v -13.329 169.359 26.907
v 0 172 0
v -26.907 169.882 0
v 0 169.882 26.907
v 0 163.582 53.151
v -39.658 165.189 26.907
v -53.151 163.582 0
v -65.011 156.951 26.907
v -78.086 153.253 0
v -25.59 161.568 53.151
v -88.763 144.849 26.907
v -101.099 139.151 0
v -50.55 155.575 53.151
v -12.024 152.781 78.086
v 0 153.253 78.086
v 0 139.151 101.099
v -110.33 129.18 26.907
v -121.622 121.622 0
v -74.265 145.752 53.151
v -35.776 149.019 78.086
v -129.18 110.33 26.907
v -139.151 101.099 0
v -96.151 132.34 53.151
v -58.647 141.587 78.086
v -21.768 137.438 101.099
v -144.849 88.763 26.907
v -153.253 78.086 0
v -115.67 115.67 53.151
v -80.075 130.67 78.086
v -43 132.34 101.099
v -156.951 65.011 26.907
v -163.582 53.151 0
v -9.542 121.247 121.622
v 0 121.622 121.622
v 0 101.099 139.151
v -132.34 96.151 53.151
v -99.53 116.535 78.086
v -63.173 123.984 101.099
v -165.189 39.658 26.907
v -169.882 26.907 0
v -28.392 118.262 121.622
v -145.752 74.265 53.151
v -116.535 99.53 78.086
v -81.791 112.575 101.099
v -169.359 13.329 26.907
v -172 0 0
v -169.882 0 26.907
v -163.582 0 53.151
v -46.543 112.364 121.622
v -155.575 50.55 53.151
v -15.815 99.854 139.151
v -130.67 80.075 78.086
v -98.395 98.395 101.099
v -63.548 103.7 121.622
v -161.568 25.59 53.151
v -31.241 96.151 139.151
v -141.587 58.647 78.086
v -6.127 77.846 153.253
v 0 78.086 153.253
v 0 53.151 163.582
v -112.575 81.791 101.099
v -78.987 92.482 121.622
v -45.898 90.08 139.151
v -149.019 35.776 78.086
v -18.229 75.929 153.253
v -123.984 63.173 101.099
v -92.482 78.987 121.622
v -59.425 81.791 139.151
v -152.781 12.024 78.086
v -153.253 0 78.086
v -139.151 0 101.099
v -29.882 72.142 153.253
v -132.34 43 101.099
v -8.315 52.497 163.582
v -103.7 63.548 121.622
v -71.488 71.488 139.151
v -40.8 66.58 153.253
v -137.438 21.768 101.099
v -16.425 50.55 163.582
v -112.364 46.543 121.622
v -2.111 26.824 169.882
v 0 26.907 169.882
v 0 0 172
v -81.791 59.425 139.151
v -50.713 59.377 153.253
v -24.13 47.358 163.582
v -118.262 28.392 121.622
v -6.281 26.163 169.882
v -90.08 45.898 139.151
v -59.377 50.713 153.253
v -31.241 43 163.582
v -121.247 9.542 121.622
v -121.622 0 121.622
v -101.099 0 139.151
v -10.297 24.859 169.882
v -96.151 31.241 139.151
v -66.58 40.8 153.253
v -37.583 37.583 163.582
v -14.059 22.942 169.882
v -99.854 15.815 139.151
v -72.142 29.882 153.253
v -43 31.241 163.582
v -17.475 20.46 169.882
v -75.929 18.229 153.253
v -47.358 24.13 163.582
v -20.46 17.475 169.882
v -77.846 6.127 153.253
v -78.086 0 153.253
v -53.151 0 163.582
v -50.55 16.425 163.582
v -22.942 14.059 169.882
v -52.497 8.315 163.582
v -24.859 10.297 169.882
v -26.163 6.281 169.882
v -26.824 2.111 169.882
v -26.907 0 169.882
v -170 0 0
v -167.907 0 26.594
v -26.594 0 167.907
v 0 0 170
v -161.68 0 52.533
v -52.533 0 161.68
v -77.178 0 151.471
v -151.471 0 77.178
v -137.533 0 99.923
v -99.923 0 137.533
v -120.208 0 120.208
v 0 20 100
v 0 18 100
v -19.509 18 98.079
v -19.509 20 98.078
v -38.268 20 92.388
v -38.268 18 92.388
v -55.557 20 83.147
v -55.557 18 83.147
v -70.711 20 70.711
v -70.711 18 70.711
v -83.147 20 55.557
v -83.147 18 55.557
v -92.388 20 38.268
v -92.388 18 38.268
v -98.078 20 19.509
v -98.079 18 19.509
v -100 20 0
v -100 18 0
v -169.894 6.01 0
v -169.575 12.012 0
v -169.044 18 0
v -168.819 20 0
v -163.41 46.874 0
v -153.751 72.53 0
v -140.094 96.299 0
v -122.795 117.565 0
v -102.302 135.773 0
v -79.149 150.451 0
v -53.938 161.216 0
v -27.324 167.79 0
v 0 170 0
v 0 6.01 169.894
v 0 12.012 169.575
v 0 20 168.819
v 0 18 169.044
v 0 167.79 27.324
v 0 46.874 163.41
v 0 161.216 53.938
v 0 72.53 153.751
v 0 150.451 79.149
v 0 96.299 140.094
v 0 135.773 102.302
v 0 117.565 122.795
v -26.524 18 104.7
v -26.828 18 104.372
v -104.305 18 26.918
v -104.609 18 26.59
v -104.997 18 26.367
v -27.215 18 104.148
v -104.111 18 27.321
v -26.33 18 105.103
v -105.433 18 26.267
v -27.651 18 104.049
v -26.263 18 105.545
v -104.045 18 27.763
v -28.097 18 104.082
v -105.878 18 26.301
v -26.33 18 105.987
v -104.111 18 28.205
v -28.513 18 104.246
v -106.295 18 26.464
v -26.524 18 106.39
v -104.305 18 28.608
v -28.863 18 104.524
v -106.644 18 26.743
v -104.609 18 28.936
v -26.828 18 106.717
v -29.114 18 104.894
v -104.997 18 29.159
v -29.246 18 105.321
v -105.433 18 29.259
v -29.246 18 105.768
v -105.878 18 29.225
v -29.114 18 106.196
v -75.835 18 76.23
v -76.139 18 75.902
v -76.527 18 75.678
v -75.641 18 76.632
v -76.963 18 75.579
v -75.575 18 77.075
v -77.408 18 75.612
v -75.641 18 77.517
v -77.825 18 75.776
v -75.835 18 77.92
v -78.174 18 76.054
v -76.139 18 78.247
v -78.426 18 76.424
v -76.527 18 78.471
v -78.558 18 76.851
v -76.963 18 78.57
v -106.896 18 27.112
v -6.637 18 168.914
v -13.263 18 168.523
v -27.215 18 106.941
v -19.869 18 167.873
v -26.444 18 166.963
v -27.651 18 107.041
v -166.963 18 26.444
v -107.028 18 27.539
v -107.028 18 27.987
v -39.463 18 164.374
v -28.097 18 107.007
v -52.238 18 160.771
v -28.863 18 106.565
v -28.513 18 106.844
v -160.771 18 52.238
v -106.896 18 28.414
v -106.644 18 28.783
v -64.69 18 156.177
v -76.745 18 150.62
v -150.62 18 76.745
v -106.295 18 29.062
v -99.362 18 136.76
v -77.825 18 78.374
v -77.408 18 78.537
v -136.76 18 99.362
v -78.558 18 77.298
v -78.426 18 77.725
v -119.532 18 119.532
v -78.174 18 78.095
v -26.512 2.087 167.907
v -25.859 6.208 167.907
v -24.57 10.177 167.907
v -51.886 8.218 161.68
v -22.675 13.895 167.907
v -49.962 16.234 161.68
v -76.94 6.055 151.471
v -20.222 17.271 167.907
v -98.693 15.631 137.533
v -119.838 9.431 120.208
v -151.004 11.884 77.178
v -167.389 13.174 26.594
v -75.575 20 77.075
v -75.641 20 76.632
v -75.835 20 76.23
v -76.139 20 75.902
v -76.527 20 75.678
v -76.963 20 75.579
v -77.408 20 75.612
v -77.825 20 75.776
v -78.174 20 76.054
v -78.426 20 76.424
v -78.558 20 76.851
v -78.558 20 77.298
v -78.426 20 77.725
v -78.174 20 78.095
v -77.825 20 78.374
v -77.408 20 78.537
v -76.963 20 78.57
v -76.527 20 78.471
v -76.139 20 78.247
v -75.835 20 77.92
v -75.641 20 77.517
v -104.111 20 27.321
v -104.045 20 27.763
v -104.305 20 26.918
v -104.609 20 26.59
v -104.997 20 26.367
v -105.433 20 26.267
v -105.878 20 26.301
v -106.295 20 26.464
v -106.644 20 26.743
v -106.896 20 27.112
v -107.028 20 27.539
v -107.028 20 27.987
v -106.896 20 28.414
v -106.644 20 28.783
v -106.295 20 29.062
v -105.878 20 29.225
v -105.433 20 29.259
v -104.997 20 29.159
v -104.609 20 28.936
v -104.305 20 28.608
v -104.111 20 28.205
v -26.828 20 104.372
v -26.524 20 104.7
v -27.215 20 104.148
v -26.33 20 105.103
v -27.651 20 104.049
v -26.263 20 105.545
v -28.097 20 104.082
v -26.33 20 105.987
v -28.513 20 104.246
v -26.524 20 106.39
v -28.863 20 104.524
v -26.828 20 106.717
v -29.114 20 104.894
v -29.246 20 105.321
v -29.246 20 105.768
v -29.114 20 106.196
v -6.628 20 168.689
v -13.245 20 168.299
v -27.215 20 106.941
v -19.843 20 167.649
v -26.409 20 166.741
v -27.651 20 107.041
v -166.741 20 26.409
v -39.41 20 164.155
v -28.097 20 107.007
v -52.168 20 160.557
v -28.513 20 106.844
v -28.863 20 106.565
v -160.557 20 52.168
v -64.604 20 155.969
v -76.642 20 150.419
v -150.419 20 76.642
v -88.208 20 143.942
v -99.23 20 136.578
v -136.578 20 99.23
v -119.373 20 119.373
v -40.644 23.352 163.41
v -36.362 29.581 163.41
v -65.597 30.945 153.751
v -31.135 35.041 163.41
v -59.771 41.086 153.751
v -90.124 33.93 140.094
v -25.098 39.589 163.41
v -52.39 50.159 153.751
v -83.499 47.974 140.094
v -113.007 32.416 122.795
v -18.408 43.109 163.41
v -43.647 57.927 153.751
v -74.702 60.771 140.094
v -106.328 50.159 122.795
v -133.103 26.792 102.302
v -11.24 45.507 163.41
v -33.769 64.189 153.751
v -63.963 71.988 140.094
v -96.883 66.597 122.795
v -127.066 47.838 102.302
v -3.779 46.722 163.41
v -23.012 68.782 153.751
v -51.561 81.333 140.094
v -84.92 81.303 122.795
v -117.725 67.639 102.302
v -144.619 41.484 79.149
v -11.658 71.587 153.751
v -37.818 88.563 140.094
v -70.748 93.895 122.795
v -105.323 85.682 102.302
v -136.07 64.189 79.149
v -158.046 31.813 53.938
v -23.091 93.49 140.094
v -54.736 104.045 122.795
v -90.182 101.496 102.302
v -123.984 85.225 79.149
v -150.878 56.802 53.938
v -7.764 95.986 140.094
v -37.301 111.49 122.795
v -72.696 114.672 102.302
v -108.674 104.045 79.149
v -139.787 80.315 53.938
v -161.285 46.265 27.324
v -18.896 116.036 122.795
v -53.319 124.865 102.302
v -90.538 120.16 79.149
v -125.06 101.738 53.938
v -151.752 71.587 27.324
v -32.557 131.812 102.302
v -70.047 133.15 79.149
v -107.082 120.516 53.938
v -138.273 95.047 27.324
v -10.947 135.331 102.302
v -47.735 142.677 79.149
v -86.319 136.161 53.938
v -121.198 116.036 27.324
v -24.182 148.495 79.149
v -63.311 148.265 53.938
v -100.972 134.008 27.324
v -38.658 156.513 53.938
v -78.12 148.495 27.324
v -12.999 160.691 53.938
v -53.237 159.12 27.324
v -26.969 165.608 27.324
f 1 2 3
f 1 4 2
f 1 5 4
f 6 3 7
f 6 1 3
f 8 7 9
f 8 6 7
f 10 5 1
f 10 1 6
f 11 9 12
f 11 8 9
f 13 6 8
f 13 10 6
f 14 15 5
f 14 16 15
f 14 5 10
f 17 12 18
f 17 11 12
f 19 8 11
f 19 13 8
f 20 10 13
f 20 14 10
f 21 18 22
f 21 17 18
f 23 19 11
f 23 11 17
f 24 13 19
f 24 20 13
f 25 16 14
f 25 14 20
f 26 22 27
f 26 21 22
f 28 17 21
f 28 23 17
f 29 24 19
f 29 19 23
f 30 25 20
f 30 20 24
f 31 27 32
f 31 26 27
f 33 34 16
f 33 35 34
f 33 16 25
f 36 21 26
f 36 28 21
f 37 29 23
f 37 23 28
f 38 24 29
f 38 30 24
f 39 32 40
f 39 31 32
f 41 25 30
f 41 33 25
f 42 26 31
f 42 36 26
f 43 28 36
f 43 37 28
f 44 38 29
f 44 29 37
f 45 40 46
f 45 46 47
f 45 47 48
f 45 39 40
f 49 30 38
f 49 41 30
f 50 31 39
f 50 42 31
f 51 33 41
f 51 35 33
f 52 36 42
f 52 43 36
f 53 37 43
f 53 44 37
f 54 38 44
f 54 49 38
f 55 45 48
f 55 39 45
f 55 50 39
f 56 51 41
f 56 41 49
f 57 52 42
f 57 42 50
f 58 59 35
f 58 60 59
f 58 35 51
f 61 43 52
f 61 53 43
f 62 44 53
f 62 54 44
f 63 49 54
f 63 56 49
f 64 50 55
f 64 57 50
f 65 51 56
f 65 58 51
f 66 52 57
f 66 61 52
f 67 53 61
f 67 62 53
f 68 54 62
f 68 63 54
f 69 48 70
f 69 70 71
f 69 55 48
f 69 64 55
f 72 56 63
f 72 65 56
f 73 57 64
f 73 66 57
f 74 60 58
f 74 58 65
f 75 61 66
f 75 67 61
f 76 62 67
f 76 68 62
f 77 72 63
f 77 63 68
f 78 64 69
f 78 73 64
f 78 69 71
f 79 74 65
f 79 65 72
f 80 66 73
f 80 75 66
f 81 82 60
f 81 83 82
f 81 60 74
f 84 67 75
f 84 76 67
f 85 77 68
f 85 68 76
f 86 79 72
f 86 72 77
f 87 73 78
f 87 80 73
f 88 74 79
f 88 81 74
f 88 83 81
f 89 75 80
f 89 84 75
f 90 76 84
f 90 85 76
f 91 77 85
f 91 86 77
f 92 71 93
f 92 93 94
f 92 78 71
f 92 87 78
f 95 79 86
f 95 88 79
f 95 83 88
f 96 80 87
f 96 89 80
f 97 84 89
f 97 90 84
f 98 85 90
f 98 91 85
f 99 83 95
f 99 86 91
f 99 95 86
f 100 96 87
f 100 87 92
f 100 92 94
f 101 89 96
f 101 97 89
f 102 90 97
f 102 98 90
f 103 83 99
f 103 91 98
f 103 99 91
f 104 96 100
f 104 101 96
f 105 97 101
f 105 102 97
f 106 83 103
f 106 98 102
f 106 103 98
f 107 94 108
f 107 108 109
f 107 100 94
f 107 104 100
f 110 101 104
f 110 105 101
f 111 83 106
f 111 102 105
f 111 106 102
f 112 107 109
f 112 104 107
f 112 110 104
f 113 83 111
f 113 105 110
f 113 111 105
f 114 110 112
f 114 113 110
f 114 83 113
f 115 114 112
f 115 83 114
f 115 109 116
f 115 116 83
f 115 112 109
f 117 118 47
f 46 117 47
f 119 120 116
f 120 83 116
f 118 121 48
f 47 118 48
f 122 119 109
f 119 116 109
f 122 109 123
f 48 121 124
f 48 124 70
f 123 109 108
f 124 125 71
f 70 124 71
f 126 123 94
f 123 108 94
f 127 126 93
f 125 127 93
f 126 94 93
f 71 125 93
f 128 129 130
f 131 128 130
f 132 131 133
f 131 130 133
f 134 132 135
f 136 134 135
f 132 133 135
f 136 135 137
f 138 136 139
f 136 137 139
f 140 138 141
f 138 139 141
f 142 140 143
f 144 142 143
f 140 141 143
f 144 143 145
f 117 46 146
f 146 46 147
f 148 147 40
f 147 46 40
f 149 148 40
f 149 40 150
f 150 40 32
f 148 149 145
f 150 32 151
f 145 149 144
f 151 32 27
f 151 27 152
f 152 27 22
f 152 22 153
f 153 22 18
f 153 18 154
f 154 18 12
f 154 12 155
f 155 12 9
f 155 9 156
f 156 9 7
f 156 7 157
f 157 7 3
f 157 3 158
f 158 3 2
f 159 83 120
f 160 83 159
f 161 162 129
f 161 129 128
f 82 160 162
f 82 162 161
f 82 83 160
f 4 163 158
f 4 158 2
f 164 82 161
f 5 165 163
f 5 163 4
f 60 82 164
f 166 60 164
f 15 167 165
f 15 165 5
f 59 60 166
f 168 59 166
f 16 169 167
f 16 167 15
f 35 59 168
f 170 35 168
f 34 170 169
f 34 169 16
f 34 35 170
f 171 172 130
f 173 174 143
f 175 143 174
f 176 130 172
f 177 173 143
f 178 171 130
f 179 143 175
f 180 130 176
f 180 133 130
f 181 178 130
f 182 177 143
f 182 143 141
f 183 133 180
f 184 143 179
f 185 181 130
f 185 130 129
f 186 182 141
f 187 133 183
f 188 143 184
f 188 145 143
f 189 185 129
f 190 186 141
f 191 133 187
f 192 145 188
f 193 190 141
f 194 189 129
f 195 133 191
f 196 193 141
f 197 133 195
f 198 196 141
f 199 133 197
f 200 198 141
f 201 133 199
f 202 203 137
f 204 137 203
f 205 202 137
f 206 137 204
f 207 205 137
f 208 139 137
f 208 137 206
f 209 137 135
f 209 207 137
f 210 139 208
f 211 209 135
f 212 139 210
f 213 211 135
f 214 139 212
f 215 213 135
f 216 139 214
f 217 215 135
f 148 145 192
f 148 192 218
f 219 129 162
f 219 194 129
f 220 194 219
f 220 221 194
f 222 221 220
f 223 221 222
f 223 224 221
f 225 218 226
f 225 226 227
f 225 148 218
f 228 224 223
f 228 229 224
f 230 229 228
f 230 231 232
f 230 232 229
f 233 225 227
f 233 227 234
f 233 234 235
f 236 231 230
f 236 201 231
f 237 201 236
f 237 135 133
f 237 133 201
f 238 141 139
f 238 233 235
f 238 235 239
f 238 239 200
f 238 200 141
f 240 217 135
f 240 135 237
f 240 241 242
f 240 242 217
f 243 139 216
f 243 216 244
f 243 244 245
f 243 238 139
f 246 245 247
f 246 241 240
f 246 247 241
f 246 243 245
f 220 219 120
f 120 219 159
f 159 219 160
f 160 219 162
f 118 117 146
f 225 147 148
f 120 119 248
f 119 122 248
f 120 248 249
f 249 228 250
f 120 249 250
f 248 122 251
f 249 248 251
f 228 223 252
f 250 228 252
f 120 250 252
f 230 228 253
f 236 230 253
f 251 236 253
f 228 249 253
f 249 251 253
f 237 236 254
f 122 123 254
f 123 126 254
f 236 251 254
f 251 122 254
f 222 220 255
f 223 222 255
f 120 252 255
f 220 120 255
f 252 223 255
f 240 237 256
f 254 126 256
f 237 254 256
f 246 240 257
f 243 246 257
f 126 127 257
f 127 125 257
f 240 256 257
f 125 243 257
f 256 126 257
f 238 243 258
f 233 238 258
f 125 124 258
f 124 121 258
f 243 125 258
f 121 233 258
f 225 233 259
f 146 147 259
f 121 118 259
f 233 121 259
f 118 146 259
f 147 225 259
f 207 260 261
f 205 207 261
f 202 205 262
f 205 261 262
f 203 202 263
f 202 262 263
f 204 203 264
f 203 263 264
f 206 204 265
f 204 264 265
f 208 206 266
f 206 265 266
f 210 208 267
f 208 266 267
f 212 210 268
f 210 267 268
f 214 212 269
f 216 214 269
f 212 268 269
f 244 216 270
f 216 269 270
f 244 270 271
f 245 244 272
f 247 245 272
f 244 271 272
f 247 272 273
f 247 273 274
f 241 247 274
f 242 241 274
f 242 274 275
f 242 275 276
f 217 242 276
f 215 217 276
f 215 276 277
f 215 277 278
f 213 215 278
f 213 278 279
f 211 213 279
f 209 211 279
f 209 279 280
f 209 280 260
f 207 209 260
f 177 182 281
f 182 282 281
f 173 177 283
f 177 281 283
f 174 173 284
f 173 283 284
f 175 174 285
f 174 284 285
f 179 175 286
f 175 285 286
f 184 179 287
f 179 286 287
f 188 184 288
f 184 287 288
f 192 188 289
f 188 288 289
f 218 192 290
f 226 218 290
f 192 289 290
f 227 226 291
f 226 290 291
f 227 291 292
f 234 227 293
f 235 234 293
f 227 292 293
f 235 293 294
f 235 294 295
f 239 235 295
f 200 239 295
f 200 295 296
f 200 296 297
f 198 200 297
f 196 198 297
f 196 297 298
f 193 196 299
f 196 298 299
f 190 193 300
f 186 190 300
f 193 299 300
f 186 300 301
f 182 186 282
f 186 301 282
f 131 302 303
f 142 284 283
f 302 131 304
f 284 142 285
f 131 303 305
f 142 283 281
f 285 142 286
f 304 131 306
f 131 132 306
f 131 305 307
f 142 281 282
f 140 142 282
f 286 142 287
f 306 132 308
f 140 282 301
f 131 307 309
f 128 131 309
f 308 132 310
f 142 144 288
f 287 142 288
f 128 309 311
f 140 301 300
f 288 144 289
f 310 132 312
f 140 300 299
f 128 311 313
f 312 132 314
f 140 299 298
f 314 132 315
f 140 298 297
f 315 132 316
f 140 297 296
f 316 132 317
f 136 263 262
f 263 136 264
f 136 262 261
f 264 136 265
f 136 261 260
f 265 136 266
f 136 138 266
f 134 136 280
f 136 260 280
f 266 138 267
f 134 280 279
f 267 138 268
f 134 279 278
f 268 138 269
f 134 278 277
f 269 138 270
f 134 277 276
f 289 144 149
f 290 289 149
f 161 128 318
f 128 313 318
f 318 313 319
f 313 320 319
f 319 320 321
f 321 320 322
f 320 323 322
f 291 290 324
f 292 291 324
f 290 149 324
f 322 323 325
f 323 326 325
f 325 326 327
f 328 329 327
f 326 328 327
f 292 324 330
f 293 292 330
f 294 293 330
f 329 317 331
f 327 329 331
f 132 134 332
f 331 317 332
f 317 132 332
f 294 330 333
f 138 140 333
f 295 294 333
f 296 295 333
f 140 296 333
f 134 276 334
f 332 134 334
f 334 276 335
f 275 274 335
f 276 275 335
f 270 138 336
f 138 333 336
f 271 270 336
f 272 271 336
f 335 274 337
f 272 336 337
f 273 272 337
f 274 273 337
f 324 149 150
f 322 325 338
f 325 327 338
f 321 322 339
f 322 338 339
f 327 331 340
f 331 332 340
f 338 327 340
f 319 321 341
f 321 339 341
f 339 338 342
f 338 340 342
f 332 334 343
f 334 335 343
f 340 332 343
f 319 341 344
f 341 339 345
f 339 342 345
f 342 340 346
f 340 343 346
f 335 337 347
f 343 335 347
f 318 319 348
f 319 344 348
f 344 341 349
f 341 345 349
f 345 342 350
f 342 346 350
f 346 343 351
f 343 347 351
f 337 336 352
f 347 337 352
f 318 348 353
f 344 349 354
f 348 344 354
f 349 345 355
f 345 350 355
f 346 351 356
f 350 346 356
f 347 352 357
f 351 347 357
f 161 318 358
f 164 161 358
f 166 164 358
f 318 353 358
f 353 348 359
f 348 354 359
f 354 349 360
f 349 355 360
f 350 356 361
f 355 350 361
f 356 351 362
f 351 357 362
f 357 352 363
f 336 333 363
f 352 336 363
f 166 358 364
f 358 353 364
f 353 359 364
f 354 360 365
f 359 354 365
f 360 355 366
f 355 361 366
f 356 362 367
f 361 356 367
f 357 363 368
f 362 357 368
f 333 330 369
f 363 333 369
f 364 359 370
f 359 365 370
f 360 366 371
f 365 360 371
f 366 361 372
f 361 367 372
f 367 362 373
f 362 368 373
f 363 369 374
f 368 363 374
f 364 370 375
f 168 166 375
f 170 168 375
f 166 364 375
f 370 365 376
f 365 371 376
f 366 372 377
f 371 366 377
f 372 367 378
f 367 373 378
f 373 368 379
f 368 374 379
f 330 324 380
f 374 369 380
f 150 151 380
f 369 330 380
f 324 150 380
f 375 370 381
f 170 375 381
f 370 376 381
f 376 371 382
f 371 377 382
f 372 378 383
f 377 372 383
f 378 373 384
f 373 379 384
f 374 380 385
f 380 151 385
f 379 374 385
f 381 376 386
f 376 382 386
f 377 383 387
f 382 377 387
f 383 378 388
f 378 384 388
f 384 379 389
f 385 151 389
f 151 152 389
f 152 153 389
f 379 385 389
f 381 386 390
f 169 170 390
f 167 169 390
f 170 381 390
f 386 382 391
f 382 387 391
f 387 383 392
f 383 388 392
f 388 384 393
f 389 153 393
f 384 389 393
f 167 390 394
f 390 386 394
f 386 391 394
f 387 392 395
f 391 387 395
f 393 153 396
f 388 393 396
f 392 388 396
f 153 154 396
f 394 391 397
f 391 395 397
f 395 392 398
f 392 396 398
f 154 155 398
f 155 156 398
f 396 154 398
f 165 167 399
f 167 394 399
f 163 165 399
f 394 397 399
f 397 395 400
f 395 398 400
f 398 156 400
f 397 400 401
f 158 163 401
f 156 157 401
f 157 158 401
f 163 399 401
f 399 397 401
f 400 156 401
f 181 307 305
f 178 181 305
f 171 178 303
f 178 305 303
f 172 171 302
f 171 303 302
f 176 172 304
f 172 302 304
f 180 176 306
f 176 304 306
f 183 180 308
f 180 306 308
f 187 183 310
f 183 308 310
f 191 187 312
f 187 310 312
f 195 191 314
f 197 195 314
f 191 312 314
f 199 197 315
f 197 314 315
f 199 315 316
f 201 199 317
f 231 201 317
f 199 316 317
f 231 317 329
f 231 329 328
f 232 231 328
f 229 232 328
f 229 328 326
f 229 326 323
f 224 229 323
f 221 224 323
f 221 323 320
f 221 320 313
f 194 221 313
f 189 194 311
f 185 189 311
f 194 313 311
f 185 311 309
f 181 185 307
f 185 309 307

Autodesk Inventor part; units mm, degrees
ref_plane "YZ Plane" through (0, 0, 0) normal (1, 0, 0) x (0, 1, 0)
ref_plane "XZ Plane" through (0, 0, 0) normal (0, 1, 0) x (-1, 0, 0)
ref_plane "XY Plane" through (0, 0, 0) normal (0, 0, 1) x (1, 0, 0)
sketch "Sketch1" plane through (0, 0, 0) normal (0, 1, 0) x (-1, 0, 0)
  arc A0 (172, 0) -> (0, 172) centre (0, 0) ccw
  line L0 (0, 172) -> (0, 0)
  line L1 (172, 0) -> (0, 0)
revolve "Revolution1" add sketch "Sketch1" angle 90 about axis through (0, 0, 172) along (0, 0, -1)
sketch "Sketch2" plane through (-172, 0, 0) normal (0, -1, 0) x (1, 0, 0)
  arc A0 (172, 170) -> (2, 0) centre (172, 0) ccw
  line L0 (172, 0) -> (172, 172) projected
  line L1 (172, 0) -> (2, 0)
  line L2 (172, 0) -> (172, 170)
revolve "Revolution2" cut sketch "Sketch2" angle 90 about axis through (0, 0, 0) along (0, 0, -1)
sketch "Sketch3" plane through (0, 0, 0) normal (1, 0, 0) x (0, -0.7071068, -0.7071068)
  arc A0 (-121.6224, 121.6224) -> (-121.6224, -121.6224) centre (0, 0) ccw projected
  arc A1 (-120.2082, 120.2082) -> (-120.2082, -120.2082) centre (0, 0) ccw projected
  line L0 (-121.6224, -121.6224) -> (-101.6224, -121.6224) construction
  line L1 (0, 0) -> (-121.6224, 121.6224) projected
  line L2 (0, 0) -> (-14.1421, 14.1421)
  line L3 (-84.8528, -56.5685) -> (-133.5155, -105.2312)
  line L4 (-84.8528, -56.5685) -> (-83.4386, -57.9828)
  line L5 (-83.4386, -57.9828) -> (-132.2603, -106.8045)
  point P0 (-134.7537, -103.641)
  dimension "d49" = 2
revolve "Revolution3" add sketch "Sketch3" angle 90 about axis through (0, 0, 0) along (0, -1, 0)
sketch "Sketch7" plane through (0, 20, 168.8194) normal (0, 1, 0) x (1, 0, 0)
  circle A0 centre (-27.763, 63.2747) radius 1.5
  circle A1 centre (-77.0746, 91.7448) radius 1.5
  circle A2 centre (-105.5447, 141.0564) radius 1.5
  line L0 (-77.7817, 91.0377) -> (-77.0746, 91.7448)
  line L1 (-77.7817, 91.0377) -> (-76.7817, 91.0377) construction
  dimension "d57" = 3
  dimension "d58" = 3
  dimension "d59" = 3
  dimension "d62" = 1
  dimension "d63" = 45
extrude "Extrusion4" cut sketch "Sketch7" against normal blind 10
properties part number "shell" material "Glass"
